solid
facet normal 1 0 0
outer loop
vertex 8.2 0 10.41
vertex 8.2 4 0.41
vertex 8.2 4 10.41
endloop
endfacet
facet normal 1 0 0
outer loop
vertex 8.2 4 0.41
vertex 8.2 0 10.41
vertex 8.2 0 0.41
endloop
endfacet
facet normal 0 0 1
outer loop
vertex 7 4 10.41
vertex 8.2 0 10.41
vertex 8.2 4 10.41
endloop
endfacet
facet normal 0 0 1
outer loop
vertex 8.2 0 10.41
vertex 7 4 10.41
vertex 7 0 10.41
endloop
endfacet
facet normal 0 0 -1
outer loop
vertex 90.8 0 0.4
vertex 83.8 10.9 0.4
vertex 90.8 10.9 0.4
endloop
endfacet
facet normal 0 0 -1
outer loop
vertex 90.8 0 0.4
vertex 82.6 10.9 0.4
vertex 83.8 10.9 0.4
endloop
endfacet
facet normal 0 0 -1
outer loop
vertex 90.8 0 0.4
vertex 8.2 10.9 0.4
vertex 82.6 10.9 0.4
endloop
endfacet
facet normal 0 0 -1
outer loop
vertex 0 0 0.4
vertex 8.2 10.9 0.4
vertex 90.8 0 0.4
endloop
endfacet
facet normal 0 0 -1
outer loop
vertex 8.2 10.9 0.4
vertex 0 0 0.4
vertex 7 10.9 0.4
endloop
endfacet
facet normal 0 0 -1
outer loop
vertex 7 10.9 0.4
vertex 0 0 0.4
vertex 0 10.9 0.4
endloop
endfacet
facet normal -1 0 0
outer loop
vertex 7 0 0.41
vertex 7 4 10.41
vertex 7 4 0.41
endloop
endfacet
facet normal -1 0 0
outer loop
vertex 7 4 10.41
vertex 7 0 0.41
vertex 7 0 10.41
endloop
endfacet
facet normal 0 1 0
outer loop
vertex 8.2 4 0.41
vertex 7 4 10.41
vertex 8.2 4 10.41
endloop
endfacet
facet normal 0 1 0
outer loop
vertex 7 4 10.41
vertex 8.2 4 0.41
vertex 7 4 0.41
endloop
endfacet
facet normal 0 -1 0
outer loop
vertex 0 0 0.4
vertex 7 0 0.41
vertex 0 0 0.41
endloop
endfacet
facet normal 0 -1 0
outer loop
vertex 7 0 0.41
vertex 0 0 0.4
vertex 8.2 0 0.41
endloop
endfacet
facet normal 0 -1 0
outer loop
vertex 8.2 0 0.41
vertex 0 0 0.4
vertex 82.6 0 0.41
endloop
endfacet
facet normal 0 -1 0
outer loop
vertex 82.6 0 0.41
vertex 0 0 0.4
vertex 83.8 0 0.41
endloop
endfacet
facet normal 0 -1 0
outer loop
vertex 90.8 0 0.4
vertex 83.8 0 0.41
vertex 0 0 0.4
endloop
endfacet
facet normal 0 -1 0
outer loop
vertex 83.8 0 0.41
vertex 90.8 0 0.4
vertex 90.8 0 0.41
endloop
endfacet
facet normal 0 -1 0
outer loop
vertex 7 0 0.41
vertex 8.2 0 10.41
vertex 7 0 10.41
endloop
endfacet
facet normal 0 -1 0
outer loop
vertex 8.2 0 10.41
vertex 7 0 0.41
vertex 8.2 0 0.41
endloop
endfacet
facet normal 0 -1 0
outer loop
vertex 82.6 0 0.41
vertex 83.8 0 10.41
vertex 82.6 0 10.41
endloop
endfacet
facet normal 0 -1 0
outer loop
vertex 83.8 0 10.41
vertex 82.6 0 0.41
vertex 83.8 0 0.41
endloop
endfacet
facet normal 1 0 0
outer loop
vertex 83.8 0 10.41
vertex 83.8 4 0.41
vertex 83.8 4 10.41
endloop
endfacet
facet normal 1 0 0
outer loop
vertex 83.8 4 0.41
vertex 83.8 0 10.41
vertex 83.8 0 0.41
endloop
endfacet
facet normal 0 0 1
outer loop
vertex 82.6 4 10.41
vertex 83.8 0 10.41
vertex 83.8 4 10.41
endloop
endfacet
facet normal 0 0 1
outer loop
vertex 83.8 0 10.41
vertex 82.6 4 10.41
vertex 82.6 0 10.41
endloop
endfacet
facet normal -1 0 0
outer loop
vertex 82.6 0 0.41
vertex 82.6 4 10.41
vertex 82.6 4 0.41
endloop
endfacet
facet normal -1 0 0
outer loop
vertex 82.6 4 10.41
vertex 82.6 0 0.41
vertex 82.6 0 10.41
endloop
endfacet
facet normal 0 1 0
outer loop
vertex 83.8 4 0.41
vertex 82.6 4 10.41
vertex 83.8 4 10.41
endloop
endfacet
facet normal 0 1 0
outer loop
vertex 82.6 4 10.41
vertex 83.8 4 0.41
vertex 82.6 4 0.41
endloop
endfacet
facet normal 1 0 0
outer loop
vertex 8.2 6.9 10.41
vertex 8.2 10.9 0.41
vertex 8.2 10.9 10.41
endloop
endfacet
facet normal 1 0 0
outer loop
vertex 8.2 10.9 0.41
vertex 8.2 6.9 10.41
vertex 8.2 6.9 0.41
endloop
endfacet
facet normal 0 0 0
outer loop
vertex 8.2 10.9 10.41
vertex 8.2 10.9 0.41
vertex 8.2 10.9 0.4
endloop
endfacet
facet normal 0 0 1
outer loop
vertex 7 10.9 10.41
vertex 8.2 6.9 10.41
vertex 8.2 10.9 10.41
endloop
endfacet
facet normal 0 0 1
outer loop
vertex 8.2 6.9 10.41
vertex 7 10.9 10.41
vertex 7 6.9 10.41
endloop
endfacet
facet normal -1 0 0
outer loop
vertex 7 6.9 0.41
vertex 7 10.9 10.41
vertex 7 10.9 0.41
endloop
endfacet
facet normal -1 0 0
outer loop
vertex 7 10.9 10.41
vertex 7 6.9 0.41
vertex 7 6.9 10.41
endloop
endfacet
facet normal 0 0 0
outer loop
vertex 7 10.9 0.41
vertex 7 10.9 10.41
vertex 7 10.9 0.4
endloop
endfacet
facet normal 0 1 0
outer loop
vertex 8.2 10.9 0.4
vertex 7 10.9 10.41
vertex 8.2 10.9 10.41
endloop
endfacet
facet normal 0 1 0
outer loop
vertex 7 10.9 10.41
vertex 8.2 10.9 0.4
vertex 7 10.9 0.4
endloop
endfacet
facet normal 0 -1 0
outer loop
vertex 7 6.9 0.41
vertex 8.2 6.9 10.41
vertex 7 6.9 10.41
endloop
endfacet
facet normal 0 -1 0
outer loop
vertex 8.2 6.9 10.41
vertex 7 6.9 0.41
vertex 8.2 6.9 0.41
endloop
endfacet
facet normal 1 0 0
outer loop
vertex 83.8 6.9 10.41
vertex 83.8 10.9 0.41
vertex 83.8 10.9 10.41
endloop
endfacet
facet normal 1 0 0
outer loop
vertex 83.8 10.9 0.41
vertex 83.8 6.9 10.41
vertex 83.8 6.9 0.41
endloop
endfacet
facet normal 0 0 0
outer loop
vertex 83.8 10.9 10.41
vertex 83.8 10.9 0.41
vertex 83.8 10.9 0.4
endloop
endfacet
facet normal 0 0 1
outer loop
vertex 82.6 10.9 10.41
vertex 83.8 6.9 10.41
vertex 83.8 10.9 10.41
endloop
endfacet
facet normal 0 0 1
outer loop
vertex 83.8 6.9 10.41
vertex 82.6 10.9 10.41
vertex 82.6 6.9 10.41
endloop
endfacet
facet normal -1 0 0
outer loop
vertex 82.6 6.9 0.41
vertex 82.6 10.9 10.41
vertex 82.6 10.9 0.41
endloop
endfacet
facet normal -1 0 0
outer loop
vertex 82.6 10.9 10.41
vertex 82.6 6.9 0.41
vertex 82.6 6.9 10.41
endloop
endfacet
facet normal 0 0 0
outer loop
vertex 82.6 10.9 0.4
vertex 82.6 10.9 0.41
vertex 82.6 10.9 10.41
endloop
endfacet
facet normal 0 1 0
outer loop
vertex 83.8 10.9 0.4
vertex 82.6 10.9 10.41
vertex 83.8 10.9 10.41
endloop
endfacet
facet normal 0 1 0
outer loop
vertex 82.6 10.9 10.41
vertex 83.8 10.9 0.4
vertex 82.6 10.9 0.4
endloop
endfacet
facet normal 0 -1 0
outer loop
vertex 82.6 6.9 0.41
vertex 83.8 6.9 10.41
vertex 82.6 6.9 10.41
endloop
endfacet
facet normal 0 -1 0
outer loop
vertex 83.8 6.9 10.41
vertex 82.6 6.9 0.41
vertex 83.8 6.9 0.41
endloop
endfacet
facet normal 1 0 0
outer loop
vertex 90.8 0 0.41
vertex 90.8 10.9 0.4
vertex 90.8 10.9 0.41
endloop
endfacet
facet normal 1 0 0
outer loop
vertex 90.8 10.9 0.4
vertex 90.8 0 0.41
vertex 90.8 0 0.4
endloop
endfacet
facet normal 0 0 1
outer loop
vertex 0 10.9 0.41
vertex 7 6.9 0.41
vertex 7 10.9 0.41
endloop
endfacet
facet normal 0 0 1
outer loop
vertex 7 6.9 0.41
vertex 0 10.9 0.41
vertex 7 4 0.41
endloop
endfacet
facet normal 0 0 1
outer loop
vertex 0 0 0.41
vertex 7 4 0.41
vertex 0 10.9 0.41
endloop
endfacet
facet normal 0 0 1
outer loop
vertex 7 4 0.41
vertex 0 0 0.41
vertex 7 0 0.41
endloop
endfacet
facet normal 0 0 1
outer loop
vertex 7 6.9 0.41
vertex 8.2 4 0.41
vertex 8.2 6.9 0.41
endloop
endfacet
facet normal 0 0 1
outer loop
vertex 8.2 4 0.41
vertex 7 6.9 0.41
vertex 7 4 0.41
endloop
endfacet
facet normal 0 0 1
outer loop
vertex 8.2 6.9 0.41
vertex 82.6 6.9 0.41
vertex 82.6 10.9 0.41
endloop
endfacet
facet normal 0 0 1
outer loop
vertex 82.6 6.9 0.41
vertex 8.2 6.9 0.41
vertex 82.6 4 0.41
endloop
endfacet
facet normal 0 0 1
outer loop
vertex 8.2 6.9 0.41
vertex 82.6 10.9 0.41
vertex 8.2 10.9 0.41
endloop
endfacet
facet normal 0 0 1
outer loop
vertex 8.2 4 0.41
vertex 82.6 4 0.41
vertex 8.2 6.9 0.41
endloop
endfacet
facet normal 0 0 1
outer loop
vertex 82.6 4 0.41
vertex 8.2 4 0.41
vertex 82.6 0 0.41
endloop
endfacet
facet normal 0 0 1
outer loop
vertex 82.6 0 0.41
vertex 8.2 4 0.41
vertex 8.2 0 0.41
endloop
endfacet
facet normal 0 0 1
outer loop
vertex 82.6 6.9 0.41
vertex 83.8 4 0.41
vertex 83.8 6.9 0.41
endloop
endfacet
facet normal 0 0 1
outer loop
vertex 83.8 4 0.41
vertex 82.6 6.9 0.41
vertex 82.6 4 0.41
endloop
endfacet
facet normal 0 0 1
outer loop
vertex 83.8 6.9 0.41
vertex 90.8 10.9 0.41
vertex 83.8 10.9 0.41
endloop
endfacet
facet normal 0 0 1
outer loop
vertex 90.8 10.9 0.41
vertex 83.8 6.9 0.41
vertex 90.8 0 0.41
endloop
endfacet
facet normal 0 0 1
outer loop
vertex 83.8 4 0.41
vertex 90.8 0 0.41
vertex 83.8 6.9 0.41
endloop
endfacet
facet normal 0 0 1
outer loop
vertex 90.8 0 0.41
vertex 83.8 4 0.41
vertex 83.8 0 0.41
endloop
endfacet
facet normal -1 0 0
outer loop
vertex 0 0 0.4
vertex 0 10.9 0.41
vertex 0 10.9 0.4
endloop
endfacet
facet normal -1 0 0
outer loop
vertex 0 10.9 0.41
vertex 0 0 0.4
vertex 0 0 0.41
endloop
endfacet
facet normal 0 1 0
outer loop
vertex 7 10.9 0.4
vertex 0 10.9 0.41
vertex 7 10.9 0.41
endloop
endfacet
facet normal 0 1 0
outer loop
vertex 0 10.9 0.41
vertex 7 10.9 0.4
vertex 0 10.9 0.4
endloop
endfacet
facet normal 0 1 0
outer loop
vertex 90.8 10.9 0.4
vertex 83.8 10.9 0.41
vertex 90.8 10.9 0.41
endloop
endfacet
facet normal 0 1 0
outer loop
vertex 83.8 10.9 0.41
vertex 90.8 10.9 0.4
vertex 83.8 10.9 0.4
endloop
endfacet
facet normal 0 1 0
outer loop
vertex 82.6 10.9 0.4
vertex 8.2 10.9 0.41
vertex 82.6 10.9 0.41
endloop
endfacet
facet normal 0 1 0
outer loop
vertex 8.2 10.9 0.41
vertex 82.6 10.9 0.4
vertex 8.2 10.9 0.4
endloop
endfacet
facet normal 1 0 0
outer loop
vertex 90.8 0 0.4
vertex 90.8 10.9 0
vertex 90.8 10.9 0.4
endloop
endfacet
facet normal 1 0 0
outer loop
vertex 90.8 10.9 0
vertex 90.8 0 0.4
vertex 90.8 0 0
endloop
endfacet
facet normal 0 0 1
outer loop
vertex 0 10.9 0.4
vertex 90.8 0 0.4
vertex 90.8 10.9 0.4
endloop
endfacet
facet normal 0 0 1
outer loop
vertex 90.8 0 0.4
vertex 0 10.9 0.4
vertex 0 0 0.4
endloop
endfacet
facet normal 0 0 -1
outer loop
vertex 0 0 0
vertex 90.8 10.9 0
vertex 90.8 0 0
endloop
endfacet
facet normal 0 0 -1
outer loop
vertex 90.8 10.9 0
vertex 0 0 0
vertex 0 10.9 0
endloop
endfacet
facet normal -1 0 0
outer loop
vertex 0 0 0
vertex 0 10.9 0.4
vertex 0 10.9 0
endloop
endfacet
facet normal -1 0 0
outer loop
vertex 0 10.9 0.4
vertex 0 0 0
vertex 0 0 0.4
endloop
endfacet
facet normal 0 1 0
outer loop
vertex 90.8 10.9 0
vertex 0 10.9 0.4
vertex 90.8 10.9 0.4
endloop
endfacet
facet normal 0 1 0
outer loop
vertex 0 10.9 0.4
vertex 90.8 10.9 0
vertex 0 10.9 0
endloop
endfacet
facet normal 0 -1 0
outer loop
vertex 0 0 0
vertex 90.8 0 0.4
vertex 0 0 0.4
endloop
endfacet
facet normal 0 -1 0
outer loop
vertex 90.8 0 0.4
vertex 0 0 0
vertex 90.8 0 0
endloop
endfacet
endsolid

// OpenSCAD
// file: ../../Base/Boxes.scad
// Fischertechnik Box Foundation
// Pre-designed Boxes

use <Constants.scad>

include <PlacementOptions.scad>

box190Width = 190;
box190Depth = 130;
box130Width = 130;
box130Depth = 95;
boxUsageHeight = 33.9;
boxWallThickness = 2.4;
boxBaseThickness = 1.0;
boxWebWidth = 3.0;

// getBoxWallThickness()
// Gets the wall thickness of a Fischertechnik Box

function getBoxWallThickness() = boxWallThickness;

// Gets the usable height of a fischertechnik box
function getBoxUsageHeight() = boxUsageHeight;

// Gets the thickness of the Fischertechnik box base.
function getBoxBaseThickness() = boxBaseThickness;

// Gets the width of a box web
function getBoxWebWidth() = boxWebWidth;

// Gets the usable inner space of a Box 190 as an x/y-list
function getBox190Space() = [
    box190Width - 2*getBoxWallThickness(), 
    box190Depth - 2*getBoxWallThickness() ];

// Imports the Fischertechnik empty box 130x190 mm and places it at position 0,0
// 190x130 are the outer sizes, the inner space is slightly smaller. Use getBox190Space() to get the inner sizes.
// This module needs the STL file "Fischertechnik Box 130x190.stl" in the library path.
// The box is positioned that the usable inner space is at the 0,0,0 position. The

module Box190() {
    translate([-getBoxWallThickness(),-getBoxWallThickness(),-getBoxBaseThickness()])
        import("Fischertechnik Box 130x190.stl", convexity=3);
}

// Gets the usable inner space of a Box 130 as an x/y-list
function getBox130Space() = [
    box130Width - 2*getBoxWallThickness(), 
    box130Depth - 2*getBoxWallThickness() ];

// Imports the Fischertechnik empty box 95x130 mm and places it at position 0,0
// 190x130 are the outer sizes, the inner space is slightly smaller. Use getBox190Space() to get the inner sizes.
// This module needs the STL file "Fischertechnik Box 95x130.stl" in the library path.
// The box is positioned that the usable inner space is at the 0,0,0 position. The

module Box130() {
    translate([-getBoxWallThickness(),-getBoxWallThickness(),-getBoxBaseThickness()])
        import("Fischertechnik Box 95x130.stl", convexity=3);
}

// Creates a web at the specified box walls
// corner 0 = LowerLeft, 1 = UpperLeft, 2 = UpperRight, 3 = LowerRight
// side 0 = LeftOfCorner, 1 = RightOfCorner
// distance = Distance in mm from the corner
// box = inner width and depth of the box (default: Box 190)
// webWidth = length of the web (default is 3 mms)
// webThickness = thickness of the web (default is 1 mm)

module BoxWeb(corner, side, distance, box=getBox190Space(), webWidth=getBoxWebWidth(), webThickness=1.0) {
    sink = getBoxWallThickness()/2;

    width = (corner % 2 == 0) ? 
            (side == LeftOfCorner ? webWidth : webThickness) :
            (side == LeftOfCorner ? webThickness : webWidth);

    depth = (corner % 2 == 0) ? 
            (side == RightOfCorner ? webWidth : webThickness) :
            (side == RightOfCorner ? webThickness : webWidth);
    
    xDiff = corner == LowerLeft ? 
                (side == LeftOfCorner ? -sink : distance) :
            (corner == UpperLeft ?                
                (side == LeftOfCorner ? distance : -sink) :
            (corner == UpperRight ?
                (side == LeftOfCorner ? box.x-webWidth+sink : box.x-distance-webThickness) :
                (side == LeftOfCorner ? box.x-distance-webThickness: box.x-webWidth+sink)));

    yDiff = corner == LowerLeft ? 
                (side == RightOfCorner ? -sink : distance) :
            (corner == UpperLeft ?
                (side == RightOfCorner ? box.y-distance : box.y-webWidth+sink) :
            (corner == UpperRight ?
                (side == RightOfCorner ? box.y-webWidth+sink : box.y-distance) :
                (side == RightOfCorner ? distance : -sink)));
    
    translate([xDiff, yDiff, -getExcess()])
        cube([width, depth, boxUsageHeight + 2*getExcess()]);
}
// file: ../../Base/Rotation.scad
// Fischertechnik Box Foundation
// Geometry Helpers Rotation

include <PlacementOptions.scad>

// getRotatedSpace(space, rotation=NoRotation)
// Rotates the space dependent on the specified rotation

function getRotatedSpace(space, rotation=NoRotation) = [
    (rotation == Rotate90 || rotation == Rotate270) ? space.y : space.x,
    (rotation == Rotate90 || rotation == Rotate270) ? space.x : space.y
];

// Rotates the given space around the fixed left lower corner
// space = the space the children needs as width/depth list [width,depth]
// rotation = 0 Rotate0 degrees, 1 Rotate90 degrees, 2 Rotate180 degrees, 3 Rotate270 degrees (equivalent to -90)

module RotateFix(space, rotation=Rotate0) {
    dy = (rotation == Rotate0 || rotation == Rotate270) ? 0 :
        (rotation == Rotate90) ? space.x :
        space.y;
    dx = (rotation < Rotate180) ? 0 :
        (rotation == Rotate180) ? space.x :
        space.y;
    
    translate([dx, dy, 0])
        rotate([0, 0, rotations[rotation]])
            children();
}
// file: ../../Base/Alignment.scad
// Fischertechnik Box Foundation
// Geometry Helpers Alignment

include <PlacementOptions.scad>

// getAlignedX(elementWidth, spaceWidth, align=AlignRight, offset=0)
// Gets the aligned X offset of an element with the given
// width in the given space.
// elementWidth = The width of the element to positon
// spaceWidth = The space where the element should be aligned
// align = 0 AlignLeft, 1 AlignCenter, 2 AlignRight
// offset = an optional offset from the aligned position. When
// aligned left or centered, then positive values are in X direction.
// When aligned right then positive values are in negative X direction.

function getAlignedX(elementWidth, spaceWidth, align=AlignRight, offset=0) =
    (align == AlignLeft) ?
        offset :
        ((align == AlignCenter) ?
        (spaceWidth - elementWidth)/2 + offset :
        spaceWidth - offset - elementWidth);

// getAlignedY(elementDepth, spaceDepth, align=AlignTop, offset=0)
// Gets the aligned Y offset of an element with the given
// depth in the given space.
// elementDepth = The depth of the element to positon
// spaceDepth = The space where the element should be aligned
// align = 0 AlignBottom, 1 AlignCenter, 2 AlignTop
// offset = an optional offset from the aligned position. When
// aligned bottom or centered, then positive values are in Y direction.
// When aligned top then positive values are in negative Y direction.

function getAlignedY(elementDepth, spaceDepth, align=AlignTop, offset=0) =
    (align == AlignBottom) ?
        offset :
        ((align == AlignCenter) ?
        (spaceDepth - elementDepth)/2 + offset :
        spaceDepth - offset - elementDepth);
// file: ../../Base/PlacementOptions.scad
// Fischertechnik Box Foundation
// Placement Options

// Alignment
NoAlign = 0;
AlignLeft = 1;
AlignBottom = 2;
AlignCenter = 3;
AlignRight = 4;
AlignTop = 5;

// Element rotation degree steps
rotations = [0, -90, -180, -270];

// Rotation
NoRotation = 0;
Rotate0 = 0;
Rotate90 = 1;
Rotate180 = 2;
Rotate270 = 3;

// Docking (seen from above)
NoDock = -1;
DockLeft = 0;
DockTop = 1;
DockRight = 2;
DockCorner = 2;
DockBottom = 3;

// Web corners
LowerLeft = 0;
UpperLeft = 1;
UpperRight = 2;
LowerRight = 3;

// Web position relative to corner
LeftOfCorner = 0;
RightOfCorner = 1;
// file: ../../Base/Placement.scad
// Fischertechnik Box Foundation
// Geometry Helpers Placement

use <Constants.scad>
use <Alignment.scad>
use <Rotation.scad>
use <Boxes.scad>

include <PlacementOptions.scad>

// Place(x=0, y=0, elementSpace=[0,0], alignX=AlignLeft, alignY=AlignBottom, rotation=Rotate0, boxSpace=getBox190Space())
// Places the child at the specified position
// y = Y-Position. This is a relative position when an X aligment is specified.
// x = X-Position. This is a relative position when an Y aligment is specified.
// elementSpace = space of the element to be placed [x,y]
// alignX = -1=NoAlign, 0 AlignLeft, 1 AlignCenter, 3 AlignRight (elementSpace and boxSpace required!)
// alignY = -1=NoAlign, 2 AlignBottom, 1 AlignCenter, 4 AlignTop (elementSpace and boxSpace required!)
// rotation = 0 Rotate0 0 degrees, 1 Rotate90 90 degrees, 
// 2 Rotate180 180 degrees, 3 Rotate270 270 degrees (equivalent to -90)
// boxSpace = Inner space of the box where the placement occurs [x,y] - default is Box 190x130 inner space

module Place(x=0, y=0, elementSpace=[0,0], 
  alignX=AlignLeft, alignY=AlignBottom, 
  rotation=NoRotation, boxSpace=getBox190Space()) {

    module Position(x, y, space, rotation=Rotate0) {
        translate([x, y, 0])
            RotateFix(space, rotation)
                children();
    }

    space = getRotatedSpace(elementSpace, rotation);
    alignedX = getAlignedX(space.x, boxSpace.x, alignX, x);
    alignedY = getAlignedY(space.y, boxSpace.y, alignY, y);
    Position(alignedX, alignedY, elementSpace, rotation)
        children();
}

// Center(space=getBox130Space(), elementSpace=[0,0])
// space = Space where the children is centered. For cylinder use centered=true and no elementSpace.
// elementSpace = space of the element to be centered [x,y]

module Center(space=getBox190Space(), elementSpace=[0,0]) {
    translate([(space.x - elementSpace.x) / 2, (space.y - elementSpace.y) / 2])
        children(0);
}

// CenterHorizontal(width=0, y=0, offset=0, space=getBox130Space())
// space = Space where the children is centered. For cylinder use centered=true and no elementSpace.
// elementSpace = space of the element to be centered [x,y]

module CenterHorizontal(width=0, y=0, offset=0, space=getBox190Space()) {
    translate([(space.x - width) / 2 + offset, y])
        children(0);
}

// CenterVertical(depth=0, x=0, offset=0, space=getBox130Space())
// space = Space where the children is centered. For cylinder use centered=true and no elementSpace.
// elementSpace = space of the element to be centered [x,y]

module CenterVertical(depth=0, x=0, offset=0, space=getBox190Space()) {
    translate([x, (space.y - depth) / 2 + offset])
        children(0);
}
// file: ../../Elements/AxisClip10.scad
// Fischertechnik Box Library
// Axis for clip 10
// 31023

use <../ModelBase/Simple.scad>

width = 12;
depth = 12;
height = 23;

// getAxisClip10Space()
// Gets the space of a frame for a clip 10 with spring ring (mot2)

function getAxisClip10Space() = [width, depth, height];

// AxisClip10()
// Axis for clip 10 with spring ring (mot2)

module AxisClip10() {
    LeveledAxisWithSpace(height, height-10, getAxisClip10Space());
}

// Tests
color("lightgray")
AxisClip10();
// file: ../../Base/Constants.scad
// Fischertechnik Box Foundation
// Constants

// Constant values necessary for multiple elements

// Base constants
dividerThickness = 1.2;
excess = 0.01;
fragments = 90;
tolerance = 0.8;

// Gets the thickness of a divider 
function getDividerThickness() = dividerThickness;

// Gets the excess that is used to merge walls into each other
function getExcess() = excess;

// Gets amount of fragments of a cylinder
function getFragments() = fragments;

// Gets the inner tolerance of a frame to each side
function getTolerance() = tolerance;


// Fischertechnik specific constants
axisDiameter = 4;
axisBottomDiameter = axisDiameter + 1;
standardEdgeDistance = 2.5;
standardWebDistance = 11.5;
standardCornerLength = 15;
tubeWallFactor = 0.8;

// Gets axis diameter
function getAxisDiameter() = axisDiameter;

// Gets axis bottom diameter for thicker part at the bottom
function getAxisBottomDiameter() = axisBottomDiameter;

// gets the standard distance to the wall of the box for dockable frames with webs
function getStandardEdgeDistance() = standardEdgeDistance;

// gets the standard distance of each web to the corner of the dockable frame
function getStandardWebDistance() = standardWebDistance;

// gets the standard length of the corner walls of a dockable frame
function getStandardCornerLength() = standardCornerLength;

// gets the wall thickness of a tube.
function getTubeWallThickness() = tubeWallFactor * getDividerThickness();
// file: ../../Elements/HolderBuildingPlate90x30.scad
// Fischertechnik Box Library
// Holder for Building Plate 90x30
// 38251

use <../ModelBase/Complex.scad>

width = 90;

// getHolderBuildingPlateSpace90x30(count = 1)
// Gets the width (.x) and depth (.y) space the holder needs.

function getHolderBuildingPlate90x30Space(count = 1) = getHolderBuildingPlateSpace(width, count);

// HolderBuildingPlate90x30(count=1, dock=false)
// Holder for building plates 90x30
// count = Count of building plates (default 1)
// dock = true if the holders are docked to the box wall (default false) 

module HolderBuildingPlate90x30(count = 1, dock = false) {
    HolderBuildingPlate(width, count, firstGapHigher = dock);
}

// Test
color("lightgray")
HolderBuildingPlate90x30();
// file: ../TestPrint.scad
// 3D Print Test Base

use <../Base/Constants.scad>

use <../Elements/AxisClip10.scad>

module TestPrint(elementSpace) {
    cube([elementSpace.x, elementSpace.y, 0.4]);
    translate([0,0,0.4+getExcess()]) {
        children();
    }
}

TestPrint(getAxisClip10Space())
    AxisClip10();
// main file
// 3D Print Test Base
// HolderBuildingPlate90x30

use <../TestPrint.scad>
use <../../Elements/HolderBuildingPlate90x30.scad>

TestPrint(getHolderBuildingPlate90x30Space())
    HolderBuildingPlate90x30();
